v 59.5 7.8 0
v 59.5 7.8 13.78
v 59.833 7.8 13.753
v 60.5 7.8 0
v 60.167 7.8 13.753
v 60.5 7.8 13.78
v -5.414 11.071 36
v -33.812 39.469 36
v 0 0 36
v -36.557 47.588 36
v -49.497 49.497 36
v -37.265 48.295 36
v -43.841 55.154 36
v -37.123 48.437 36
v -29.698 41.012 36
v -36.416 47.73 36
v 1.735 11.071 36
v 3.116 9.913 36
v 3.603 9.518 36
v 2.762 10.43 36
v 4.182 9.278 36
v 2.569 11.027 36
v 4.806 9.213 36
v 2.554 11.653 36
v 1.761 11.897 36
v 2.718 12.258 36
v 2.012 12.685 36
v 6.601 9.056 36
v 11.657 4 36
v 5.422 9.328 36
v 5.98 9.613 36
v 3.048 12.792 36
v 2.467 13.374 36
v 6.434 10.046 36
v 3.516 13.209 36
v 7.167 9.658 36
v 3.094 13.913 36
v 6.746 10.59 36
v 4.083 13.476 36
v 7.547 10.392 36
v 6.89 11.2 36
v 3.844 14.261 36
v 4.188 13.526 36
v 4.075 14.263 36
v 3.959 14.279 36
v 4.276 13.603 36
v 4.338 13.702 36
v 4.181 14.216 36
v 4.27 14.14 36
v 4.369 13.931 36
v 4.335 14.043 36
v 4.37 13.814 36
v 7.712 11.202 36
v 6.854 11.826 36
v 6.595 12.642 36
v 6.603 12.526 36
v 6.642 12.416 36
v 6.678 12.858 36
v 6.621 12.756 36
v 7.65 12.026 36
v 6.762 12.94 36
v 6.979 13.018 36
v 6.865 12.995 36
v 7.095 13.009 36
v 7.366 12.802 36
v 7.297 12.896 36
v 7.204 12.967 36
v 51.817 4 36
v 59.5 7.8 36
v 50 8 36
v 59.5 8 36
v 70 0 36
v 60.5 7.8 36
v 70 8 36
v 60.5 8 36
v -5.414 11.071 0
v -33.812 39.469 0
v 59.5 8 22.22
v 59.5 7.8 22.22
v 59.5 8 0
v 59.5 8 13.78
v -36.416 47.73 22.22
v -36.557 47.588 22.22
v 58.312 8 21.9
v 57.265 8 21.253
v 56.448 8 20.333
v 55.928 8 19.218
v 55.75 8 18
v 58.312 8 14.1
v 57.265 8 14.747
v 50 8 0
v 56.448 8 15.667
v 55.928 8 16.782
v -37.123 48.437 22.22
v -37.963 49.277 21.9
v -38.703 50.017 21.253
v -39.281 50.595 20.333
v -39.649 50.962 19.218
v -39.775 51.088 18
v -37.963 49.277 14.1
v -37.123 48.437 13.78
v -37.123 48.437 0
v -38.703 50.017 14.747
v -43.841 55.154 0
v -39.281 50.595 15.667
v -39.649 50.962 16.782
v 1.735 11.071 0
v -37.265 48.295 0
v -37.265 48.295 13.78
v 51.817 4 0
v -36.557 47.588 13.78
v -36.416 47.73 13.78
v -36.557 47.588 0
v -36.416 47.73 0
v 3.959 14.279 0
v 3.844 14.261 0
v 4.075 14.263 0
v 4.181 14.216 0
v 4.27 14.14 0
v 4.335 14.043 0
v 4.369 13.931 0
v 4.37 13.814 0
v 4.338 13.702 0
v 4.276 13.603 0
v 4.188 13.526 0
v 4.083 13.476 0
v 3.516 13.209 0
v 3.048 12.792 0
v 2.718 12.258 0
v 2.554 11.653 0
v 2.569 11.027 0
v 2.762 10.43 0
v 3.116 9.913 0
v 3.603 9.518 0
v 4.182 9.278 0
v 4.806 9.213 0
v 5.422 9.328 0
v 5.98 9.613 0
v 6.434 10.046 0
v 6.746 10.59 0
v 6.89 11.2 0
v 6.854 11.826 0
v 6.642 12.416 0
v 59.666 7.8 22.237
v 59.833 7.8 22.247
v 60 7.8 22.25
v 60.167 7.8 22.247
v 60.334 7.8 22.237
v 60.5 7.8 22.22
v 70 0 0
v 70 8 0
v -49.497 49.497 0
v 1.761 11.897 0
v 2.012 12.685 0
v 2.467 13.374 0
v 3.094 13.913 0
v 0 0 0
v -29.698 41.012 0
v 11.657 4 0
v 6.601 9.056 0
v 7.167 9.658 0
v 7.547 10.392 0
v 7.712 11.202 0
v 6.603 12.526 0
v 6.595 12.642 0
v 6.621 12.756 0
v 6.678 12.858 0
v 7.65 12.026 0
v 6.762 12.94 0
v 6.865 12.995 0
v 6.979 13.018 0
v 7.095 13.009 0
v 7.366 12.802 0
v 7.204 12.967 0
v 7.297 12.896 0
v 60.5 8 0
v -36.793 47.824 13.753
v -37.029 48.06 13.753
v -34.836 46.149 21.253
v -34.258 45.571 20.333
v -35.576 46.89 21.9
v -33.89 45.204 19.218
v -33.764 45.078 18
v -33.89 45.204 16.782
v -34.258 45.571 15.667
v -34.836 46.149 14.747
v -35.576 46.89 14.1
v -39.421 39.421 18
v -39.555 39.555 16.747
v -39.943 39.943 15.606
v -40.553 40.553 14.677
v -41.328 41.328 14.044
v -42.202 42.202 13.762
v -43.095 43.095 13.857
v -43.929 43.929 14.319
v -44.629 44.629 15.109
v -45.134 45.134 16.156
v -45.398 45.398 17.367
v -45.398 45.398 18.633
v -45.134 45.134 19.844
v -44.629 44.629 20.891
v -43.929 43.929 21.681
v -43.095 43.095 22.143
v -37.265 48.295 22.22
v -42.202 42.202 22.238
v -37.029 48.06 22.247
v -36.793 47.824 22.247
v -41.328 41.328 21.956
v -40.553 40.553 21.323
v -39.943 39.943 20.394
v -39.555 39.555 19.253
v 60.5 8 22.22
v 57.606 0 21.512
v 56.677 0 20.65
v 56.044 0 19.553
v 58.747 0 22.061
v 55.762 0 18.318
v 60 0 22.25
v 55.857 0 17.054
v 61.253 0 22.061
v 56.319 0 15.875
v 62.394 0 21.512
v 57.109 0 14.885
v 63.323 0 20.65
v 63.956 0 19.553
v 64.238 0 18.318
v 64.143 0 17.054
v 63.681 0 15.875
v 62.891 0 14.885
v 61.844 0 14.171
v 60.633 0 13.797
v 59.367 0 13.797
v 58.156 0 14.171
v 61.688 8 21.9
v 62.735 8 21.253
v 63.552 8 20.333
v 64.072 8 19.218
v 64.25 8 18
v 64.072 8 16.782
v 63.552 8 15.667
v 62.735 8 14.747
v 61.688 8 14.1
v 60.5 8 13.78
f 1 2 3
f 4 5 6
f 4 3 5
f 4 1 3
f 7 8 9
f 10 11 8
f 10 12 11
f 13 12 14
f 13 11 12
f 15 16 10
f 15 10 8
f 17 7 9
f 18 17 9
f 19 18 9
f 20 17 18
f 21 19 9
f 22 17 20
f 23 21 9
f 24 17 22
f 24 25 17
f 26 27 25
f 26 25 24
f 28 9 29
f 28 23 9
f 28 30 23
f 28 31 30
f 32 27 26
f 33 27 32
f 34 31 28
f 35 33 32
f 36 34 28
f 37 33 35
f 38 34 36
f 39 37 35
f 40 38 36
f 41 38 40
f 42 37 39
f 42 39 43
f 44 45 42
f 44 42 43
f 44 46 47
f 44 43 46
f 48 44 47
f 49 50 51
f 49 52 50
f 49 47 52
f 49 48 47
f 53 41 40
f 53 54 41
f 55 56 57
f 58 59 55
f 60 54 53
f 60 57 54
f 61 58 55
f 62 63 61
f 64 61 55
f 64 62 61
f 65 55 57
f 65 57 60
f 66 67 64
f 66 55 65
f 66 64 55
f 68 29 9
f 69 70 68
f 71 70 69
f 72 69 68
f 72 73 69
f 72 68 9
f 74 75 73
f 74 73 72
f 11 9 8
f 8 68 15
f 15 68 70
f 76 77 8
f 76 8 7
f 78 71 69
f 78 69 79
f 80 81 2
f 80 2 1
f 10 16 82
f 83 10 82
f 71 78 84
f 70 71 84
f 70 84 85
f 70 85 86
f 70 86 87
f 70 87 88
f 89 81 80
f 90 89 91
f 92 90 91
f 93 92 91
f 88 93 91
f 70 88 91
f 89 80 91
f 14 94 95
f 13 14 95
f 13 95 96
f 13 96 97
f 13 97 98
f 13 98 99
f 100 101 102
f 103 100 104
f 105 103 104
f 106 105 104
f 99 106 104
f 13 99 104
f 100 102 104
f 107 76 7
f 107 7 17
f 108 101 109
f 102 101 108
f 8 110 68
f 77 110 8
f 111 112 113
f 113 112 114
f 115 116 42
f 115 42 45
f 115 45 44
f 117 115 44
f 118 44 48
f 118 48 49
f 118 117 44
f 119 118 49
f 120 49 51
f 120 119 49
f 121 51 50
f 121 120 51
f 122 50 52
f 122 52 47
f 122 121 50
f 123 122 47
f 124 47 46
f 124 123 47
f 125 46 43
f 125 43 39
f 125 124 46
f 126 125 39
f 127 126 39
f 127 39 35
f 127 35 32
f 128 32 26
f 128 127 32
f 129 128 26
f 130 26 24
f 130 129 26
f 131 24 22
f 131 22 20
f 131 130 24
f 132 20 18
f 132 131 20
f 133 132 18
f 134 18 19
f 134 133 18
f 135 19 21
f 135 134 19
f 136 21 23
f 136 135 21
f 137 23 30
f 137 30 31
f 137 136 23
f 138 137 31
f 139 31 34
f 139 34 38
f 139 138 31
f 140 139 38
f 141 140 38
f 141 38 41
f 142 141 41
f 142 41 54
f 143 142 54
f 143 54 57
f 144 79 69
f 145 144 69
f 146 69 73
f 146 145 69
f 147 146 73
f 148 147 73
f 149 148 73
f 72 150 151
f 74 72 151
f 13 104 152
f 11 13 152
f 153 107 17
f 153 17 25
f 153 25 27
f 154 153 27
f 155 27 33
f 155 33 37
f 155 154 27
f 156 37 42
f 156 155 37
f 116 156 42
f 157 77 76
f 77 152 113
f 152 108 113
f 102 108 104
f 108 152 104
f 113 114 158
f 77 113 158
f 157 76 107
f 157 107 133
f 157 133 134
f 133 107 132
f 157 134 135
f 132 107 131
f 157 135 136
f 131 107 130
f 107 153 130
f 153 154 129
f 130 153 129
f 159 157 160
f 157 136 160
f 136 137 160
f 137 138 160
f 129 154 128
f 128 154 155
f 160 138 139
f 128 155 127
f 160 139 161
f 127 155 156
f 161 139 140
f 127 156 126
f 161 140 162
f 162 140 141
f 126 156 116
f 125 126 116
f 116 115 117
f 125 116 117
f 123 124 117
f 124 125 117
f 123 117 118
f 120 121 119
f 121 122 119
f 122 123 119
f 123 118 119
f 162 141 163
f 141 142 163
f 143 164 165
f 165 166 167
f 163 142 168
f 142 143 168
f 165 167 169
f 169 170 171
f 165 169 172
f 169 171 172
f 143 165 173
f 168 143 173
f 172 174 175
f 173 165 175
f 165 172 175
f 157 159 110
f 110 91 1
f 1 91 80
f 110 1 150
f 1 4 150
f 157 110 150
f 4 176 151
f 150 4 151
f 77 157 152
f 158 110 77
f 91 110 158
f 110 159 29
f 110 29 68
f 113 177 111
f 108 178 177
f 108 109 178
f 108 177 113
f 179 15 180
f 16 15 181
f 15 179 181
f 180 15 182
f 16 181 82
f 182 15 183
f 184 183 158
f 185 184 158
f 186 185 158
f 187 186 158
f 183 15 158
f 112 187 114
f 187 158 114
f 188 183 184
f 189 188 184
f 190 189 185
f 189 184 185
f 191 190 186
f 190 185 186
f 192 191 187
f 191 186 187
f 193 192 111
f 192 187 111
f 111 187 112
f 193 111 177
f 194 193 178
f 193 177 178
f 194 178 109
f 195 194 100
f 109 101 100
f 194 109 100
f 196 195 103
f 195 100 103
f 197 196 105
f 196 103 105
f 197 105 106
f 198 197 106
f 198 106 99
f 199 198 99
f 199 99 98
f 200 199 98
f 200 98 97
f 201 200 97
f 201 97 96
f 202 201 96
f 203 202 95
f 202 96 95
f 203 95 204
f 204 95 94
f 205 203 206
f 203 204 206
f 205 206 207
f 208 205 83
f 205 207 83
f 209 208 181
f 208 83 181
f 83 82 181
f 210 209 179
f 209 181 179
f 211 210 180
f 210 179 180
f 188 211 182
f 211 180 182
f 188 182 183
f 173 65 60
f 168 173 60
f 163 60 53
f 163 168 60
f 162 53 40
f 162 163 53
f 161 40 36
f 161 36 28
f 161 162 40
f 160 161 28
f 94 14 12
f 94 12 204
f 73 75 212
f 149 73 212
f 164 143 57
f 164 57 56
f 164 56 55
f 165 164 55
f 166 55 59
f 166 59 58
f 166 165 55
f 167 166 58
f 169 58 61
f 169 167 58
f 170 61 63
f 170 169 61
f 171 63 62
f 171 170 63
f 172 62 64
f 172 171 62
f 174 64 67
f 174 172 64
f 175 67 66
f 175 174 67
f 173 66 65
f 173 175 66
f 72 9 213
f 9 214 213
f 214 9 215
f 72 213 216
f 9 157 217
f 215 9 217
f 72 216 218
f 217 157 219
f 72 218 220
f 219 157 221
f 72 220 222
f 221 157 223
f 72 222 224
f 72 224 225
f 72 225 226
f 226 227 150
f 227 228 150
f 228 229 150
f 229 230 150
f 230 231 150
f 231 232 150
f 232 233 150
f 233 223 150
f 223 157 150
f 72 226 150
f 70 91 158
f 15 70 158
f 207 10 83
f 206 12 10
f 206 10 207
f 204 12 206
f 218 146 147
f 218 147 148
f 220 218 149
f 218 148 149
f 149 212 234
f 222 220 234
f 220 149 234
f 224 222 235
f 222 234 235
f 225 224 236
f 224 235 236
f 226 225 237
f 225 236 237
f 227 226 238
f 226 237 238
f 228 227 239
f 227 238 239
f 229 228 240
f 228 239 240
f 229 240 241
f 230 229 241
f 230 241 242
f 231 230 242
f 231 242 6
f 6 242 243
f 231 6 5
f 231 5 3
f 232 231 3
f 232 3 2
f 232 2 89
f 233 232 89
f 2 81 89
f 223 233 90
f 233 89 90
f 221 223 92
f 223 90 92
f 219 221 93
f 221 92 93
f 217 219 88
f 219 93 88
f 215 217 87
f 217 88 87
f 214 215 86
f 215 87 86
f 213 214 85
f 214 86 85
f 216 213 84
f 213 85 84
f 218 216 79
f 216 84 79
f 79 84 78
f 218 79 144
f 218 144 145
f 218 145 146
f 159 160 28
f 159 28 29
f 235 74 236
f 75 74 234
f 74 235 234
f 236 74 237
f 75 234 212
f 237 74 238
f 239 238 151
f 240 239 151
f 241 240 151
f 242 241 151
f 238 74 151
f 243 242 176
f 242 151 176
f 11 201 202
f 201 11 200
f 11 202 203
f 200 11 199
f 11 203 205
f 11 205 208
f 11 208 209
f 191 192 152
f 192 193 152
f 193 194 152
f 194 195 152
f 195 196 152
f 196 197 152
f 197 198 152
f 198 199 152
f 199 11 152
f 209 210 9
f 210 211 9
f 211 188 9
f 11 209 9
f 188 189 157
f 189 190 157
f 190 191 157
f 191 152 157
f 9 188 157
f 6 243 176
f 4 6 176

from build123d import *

# Parameters (mm, degrees)
EXTRUDE_1_DEPTH                 = 36
CUT_EXTRUDE_1_REACH             = 93.758
SKETCH_2_R                      = 4.25
CUT_EXTRUDE_2_REACH             = 90.803
SKETCH_3_R                      = 4.25
CUT_EXTRUDE_2_DIRECTION_2_DEPTH = 89.803380595
SKETCH_4_W                      = 1
SKETCH_4_H                      = 36
CUT_EXTRUDE_3_DEPTH             = 0.2
SKETCH_5_W                      = 36
SKETCH_5_H                      = 1
CUT_EXTRUDE_4_DEPTH             = 0.2


with BuildPart() as part:
    # 草图1 → 凸台-拉伸1 (new body)
    with BuildSketch(Plane.XY):
        Polygon((0, 0), (70, 0), (70, 8), (50, 8), (-29.69848481, 41.012193309), (-43.840620434, 55.154328933), (-49.497474683, 49.497474683), align=None)
        with BuildLine():
            Line((-33.812061864, 39.468916114), (-5.414213562, 11.071067812))
            Line((-5.414213562, 11.071067812), (1.735433814, 11.071067812))
            ThreePointArc((1.735433814, 11.071067812), (2.215643659, 13.045304249), (3.843807178, 14.260744318))
            ThreePointArc((3.843807178, 14.260744318), (4.355517598, 13.988067869), (4.08284115, 13.476357449))
            ThreePointArc((4.08284115, 13.476357449), (3.884071826, 9.376978879), (6.642219074, 12.416228401))
            ThreePointArc((6.642219074, 12.416228401), (6.811241616, 12.970873675), (7.365886891, 12.801851133))
            ThreePointArc((7.365886891, 12.801851133), (7.657726441, 10.791119753), (6.601290107, 9.055564143))
            Line((6.601290107, 9.055564143), (11.656854249, 4))
            Line((11.656854249, 4), (51.81747646, 4))
            Line((51.81747646, 4), (-33.812061864, 39.468916114))
        make_face(mode=Mode.SUBTRACT)
    extrude(amount=EXTRUDE_1_DEPTH)

    # 草图2 → 切除-拉伸1 (cut, up to next)
    with BuildSketch(Plane(origin=(0, 8, 0), x_dir=(1, 0, 0), z_dir=(0, 1, 0)), mode=Mode.PRIVATE) as cut_extrude_1_sk1:
        with Locations(Location((60, -18, 0), (0, 0, 270))):
            Circle(SKETCH_2_R)
    cut_extrude_1_tool1 = extrude(cut_extrude_1_sk1.sketch, amount=-CUT_EXTRUDE_1_REACH, mode=Mode.PRIVATE) & part.part
    add(cut_extrude_1_tool1.solids().sort_by_distance((60, 8, 18))[0], mode=Mode.SUBTRACT)

    # 草图3 → 切除-拉伸2 (cut, up to next)
    with BuildSketch(Plane(origin=(5.656854249, 5.656854249, 0), x_dir=(0, 0, -1), z_dir=(0.7071067811865437, 0.7071067811865513, 0)), mode=Mode.PRIVATE) as cut_extrude_2_sk1:
        with Locations(Location((-18, 60, 0), (0, 0, 270))):
            Circle(SKETCH_3_R)
    cut_extrude_2_tool1 = extrude(cut_extrude_2_sk1.sketch, amount=-CUT_EXTRUDE_2_REACH, mode=Mode.PRIVATE) & part.part
    add(cut_extrude_2_tool1.solids().sort_by_distance((-36.769553, 48.083261, 18))[0], mode=Mode.SUBTRACT)

    # 草图3 → 切除-拉伸2 direction 2 (cut)
    with BuildSketch(Plane(origin=(5.656854249, 5.656854249, 0), x_dir=(0, 0, -1), z_dir=(0.7071067811865437, 0.7071067811865513, 0))):
        with Locations(Location((-18, 60, 0), (0, 0, 270))):
            Circle(SKETCH_3_R)
    extrude(amount=CUT_EXTRUDE_2_DIRECTION_2_DEPTH, mode=Mode.SUBTRACT)

    # 草图4 → 切除-拉伸3 (cut)
    with BuildSketch(Plane(origin=(0, 8, 0), x_dir=(1, 0, 0), z_dir=(0, 1, 0))):
        with Locations((60, -18)):
            Rectangle(SKETCH_4_W, SKETCH_4_H)
    extrude(amount=-CUT_EXTRUDE_3_DEPTH, mode=Mode.SUBTRACT)

    # 草图5 → 切除-拉伸4 (cut)
    with BuildSketch(Plane(origin=(5.656854249, 5.656854249, 0), x_dir=(0, 0, -1), z_dir=(0.7071067811865437, 0.7071067811865513, 0))):
        with Locations((-18, 60)):
            Rectangle(SKETCH_5_W, SKETCH_5_H)
    extrude(amount=-CUT_EXTRUDE_4_DEPTH, mode=Mode.SUBTRACT)


solid = part.part
